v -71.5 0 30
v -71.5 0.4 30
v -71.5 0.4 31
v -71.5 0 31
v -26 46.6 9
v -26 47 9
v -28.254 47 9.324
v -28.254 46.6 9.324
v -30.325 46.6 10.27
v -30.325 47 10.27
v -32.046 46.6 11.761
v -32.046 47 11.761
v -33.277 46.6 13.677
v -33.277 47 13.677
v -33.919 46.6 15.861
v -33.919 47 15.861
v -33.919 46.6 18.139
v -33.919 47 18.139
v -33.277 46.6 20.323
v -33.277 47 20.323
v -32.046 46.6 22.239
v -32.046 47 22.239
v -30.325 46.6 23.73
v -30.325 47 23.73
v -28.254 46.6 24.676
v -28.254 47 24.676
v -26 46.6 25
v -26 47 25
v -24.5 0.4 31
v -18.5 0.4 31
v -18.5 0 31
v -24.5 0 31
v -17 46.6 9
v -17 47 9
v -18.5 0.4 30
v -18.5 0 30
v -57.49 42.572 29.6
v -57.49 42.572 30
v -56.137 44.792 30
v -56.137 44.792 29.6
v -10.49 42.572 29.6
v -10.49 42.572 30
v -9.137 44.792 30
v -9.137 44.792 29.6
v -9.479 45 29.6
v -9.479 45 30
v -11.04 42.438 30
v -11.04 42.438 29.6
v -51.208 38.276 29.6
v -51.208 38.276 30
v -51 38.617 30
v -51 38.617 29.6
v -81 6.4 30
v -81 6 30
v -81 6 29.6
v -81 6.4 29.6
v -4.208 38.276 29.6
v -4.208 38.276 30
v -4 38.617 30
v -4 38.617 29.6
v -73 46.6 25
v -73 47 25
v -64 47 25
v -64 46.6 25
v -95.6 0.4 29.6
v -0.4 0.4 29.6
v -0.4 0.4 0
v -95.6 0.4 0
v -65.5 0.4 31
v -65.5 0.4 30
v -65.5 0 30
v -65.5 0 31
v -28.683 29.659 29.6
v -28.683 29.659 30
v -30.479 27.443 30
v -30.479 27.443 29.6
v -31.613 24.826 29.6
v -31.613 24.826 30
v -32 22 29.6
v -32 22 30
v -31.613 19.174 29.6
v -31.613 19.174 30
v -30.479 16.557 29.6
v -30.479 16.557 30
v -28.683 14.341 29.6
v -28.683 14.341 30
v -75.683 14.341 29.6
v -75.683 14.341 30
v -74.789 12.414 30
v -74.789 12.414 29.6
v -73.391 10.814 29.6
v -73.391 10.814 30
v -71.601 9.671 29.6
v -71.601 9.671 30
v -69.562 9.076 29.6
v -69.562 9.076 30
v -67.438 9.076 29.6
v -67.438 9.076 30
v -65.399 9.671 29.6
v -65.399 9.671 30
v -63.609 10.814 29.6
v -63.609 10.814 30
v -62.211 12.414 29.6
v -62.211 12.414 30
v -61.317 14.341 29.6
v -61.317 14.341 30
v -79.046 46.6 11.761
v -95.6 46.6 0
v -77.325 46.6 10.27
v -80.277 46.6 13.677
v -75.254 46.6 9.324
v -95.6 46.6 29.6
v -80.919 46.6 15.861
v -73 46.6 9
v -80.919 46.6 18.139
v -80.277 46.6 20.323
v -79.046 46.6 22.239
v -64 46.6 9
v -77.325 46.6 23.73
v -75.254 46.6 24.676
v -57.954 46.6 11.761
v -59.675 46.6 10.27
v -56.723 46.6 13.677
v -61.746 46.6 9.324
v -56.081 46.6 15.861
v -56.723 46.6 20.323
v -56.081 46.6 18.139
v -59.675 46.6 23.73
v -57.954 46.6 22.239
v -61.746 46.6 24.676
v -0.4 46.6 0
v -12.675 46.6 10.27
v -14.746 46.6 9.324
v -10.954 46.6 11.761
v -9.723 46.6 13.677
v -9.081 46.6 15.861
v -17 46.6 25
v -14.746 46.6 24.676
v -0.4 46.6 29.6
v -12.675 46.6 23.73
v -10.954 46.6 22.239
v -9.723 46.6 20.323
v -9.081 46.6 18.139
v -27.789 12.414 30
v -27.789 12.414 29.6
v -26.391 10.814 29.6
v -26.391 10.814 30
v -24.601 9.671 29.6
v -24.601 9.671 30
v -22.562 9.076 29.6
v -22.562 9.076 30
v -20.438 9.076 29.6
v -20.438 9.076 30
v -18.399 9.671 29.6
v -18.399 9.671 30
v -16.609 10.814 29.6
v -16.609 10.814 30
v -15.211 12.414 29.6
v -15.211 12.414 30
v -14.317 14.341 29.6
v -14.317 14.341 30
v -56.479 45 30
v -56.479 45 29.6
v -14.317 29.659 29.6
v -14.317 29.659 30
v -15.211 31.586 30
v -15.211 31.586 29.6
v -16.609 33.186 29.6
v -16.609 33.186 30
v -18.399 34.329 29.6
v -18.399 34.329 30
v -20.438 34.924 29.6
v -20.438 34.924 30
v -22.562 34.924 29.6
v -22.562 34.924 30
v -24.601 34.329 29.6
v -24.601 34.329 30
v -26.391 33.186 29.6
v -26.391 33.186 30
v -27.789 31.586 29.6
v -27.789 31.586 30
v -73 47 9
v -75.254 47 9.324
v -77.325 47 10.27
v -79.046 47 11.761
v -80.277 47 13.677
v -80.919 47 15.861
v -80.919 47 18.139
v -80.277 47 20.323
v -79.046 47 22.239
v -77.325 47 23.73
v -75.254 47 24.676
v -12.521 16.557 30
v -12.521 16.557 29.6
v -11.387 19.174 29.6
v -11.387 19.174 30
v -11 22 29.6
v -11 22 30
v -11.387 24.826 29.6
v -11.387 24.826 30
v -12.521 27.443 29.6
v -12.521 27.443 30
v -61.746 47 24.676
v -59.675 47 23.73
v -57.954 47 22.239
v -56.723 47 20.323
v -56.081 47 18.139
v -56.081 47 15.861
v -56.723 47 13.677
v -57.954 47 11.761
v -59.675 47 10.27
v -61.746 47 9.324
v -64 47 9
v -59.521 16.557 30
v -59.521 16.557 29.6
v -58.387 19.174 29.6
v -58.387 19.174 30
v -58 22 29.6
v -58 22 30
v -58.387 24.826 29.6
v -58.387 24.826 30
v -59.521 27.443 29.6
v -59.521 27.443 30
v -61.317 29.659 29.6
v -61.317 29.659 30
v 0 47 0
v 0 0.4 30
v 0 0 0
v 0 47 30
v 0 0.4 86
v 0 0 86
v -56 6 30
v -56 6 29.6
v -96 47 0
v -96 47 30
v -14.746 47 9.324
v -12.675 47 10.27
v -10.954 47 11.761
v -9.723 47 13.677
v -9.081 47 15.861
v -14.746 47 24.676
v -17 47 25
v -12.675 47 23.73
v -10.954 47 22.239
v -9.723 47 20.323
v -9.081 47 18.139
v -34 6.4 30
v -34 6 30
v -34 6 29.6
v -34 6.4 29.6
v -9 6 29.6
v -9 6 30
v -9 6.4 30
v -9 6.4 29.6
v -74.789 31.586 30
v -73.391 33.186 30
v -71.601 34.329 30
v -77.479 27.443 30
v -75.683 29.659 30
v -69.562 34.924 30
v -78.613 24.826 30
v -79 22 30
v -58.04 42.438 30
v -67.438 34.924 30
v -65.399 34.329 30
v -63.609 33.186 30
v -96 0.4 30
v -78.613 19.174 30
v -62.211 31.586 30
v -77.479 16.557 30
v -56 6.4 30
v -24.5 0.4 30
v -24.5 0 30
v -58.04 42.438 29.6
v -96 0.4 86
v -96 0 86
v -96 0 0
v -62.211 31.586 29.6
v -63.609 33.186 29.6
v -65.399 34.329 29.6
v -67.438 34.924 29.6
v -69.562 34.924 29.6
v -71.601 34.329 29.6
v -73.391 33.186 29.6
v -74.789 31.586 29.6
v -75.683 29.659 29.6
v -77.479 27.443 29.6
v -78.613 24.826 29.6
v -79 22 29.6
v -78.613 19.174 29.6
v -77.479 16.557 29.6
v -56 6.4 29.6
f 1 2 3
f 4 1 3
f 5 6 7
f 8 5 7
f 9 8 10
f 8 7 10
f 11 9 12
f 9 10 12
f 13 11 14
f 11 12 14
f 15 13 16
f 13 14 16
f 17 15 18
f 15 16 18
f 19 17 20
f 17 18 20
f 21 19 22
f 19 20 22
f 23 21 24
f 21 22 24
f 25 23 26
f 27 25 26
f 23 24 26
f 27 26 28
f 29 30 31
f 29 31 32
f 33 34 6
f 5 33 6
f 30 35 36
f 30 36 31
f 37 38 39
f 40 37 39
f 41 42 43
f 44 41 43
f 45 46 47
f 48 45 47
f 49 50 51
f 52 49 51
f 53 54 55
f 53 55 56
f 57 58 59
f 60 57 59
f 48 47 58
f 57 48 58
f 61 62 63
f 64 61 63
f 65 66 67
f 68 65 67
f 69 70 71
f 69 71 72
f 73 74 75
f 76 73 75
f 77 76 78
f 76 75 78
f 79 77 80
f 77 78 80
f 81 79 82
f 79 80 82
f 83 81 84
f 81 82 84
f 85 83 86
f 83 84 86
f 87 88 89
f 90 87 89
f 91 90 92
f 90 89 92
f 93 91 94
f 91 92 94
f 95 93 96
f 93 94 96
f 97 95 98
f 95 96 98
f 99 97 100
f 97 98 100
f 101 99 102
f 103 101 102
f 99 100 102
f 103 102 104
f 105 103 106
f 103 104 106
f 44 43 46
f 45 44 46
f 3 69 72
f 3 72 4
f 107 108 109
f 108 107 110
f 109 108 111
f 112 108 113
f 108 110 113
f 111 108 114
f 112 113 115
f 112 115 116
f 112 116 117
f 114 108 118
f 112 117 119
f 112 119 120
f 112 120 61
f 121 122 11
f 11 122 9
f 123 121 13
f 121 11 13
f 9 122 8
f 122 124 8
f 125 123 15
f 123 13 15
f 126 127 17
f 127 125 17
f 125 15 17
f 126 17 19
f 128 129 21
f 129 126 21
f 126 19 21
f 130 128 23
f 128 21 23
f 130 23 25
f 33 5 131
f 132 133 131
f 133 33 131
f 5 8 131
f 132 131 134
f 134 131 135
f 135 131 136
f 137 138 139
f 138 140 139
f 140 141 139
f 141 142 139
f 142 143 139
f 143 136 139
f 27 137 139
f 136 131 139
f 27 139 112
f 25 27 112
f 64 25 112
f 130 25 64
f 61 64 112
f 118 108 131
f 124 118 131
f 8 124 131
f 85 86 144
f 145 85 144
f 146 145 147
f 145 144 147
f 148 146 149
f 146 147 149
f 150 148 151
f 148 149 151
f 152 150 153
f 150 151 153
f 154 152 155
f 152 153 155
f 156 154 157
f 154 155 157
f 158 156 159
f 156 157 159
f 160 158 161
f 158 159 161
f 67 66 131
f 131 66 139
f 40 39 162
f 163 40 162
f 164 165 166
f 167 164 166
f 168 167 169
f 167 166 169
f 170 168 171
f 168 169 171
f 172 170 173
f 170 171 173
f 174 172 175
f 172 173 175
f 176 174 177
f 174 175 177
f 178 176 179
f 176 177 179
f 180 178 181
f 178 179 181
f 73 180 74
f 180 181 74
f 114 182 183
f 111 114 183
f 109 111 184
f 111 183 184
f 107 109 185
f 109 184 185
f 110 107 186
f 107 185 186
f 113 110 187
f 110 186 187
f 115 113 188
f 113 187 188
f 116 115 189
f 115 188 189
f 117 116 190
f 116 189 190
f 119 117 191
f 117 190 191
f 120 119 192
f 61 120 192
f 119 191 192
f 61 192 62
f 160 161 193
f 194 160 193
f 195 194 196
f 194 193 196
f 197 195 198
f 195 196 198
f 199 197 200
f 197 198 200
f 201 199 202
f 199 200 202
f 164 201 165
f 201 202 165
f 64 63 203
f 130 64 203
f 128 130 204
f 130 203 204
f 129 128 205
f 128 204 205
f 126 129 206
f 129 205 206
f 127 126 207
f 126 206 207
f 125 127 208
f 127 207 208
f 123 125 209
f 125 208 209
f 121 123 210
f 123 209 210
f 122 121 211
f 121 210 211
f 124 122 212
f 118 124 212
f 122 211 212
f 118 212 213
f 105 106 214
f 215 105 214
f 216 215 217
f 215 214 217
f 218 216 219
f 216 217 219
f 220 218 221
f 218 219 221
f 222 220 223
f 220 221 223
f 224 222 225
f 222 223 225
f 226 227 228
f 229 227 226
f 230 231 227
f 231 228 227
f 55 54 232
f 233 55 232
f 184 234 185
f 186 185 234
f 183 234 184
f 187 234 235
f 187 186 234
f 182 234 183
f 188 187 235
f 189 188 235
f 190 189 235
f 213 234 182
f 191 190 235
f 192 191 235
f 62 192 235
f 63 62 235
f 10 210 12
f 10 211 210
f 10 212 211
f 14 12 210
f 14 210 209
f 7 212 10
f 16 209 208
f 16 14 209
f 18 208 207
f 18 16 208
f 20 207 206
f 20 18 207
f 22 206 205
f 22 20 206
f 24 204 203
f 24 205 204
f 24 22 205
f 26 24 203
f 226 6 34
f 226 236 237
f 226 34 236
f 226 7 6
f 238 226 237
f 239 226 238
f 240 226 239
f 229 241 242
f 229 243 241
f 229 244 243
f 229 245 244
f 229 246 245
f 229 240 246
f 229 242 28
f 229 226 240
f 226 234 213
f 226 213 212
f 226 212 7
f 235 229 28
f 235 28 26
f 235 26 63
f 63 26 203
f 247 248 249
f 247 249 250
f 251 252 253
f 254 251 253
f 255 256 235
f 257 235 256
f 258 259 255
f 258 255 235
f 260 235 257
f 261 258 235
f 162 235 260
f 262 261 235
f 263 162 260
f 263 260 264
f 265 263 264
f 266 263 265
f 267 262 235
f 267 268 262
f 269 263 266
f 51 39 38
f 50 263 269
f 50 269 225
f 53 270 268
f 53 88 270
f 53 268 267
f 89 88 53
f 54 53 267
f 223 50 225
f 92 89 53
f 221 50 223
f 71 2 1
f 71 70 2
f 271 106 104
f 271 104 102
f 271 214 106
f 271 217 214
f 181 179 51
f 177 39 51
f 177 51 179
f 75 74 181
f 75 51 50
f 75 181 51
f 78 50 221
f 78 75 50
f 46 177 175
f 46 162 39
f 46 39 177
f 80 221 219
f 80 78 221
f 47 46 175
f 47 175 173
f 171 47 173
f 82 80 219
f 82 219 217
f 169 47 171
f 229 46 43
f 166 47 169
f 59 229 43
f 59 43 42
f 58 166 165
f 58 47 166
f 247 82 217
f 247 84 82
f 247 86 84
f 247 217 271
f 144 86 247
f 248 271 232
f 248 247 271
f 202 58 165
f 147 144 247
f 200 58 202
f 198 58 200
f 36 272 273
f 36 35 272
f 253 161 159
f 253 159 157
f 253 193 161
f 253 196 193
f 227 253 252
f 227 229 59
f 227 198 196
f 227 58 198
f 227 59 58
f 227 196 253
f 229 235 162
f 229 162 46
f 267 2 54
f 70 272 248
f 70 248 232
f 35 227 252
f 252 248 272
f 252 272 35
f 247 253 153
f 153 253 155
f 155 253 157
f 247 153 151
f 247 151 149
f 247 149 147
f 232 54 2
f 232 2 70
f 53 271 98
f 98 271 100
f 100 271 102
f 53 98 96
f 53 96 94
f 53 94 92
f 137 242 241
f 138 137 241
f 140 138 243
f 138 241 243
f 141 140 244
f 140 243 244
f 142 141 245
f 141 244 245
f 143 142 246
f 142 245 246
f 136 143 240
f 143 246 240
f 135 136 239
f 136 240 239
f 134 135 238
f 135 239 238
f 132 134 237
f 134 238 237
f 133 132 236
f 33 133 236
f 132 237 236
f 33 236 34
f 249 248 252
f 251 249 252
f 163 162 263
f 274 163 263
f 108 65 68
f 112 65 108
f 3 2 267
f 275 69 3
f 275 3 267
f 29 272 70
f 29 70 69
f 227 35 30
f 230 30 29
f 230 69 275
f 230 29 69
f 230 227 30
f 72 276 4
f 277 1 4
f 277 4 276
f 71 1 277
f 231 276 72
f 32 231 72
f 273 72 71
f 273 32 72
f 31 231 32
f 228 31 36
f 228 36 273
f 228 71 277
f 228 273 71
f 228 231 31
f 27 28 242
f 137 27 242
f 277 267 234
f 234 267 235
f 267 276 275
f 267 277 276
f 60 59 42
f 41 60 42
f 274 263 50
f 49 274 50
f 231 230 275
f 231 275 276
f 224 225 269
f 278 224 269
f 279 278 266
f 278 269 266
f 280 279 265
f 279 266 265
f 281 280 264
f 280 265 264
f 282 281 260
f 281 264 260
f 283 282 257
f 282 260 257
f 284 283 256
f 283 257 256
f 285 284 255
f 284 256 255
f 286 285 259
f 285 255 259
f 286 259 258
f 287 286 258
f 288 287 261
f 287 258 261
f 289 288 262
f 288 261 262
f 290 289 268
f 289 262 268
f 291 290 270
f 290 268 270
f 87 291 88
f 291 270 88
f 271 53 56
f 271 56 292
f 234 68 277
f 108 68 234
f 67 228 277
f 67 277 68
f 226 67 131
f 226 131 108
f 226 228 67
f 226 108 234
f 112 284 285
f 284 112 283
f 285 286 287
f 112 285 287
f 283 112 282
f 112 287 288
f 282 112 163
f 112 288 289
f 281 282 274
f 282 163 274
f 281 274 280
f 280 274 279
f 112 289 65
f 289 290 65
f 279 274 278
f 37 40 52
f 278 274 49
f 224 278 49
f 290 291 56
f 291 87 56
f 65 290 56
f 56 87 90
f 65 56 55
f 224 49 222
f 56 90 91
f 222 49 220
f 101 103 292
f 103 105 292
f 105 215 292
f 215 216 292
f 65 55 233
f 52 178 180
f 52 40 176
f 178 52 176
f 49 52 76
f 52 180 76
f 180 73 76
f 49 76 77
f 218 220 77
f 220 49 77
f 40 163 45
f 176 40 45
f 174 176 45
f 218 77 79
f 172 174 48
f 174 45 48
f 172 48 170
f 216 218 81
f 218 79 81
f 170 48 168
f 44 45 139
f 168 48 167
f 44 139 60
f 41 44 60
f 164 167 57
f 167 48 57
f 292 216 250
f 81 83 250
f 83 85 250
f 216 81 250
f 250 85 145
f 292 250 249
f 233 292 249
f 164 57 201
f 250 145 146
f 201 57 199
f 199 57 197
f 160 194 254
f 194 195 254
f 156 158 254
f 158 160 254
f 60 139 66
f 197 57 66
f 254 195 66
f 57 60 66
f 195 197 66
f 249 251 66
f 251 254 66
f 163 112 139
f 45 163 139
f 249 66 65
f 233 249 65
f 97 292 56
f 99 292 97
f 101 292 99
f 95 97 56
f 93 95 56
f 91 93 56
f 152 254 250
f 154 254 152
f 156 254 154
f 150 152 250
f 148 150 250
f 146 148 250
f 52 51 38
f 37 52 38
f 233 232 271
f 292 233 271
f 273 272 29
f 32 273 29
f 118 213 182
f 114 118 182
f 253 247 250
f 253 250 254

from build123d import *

# Parameters (mm, degrees)
F1_DEPTH = 96
F2_T     = -0.4
F3_W     = 25
F3_H     = 0.4
F4_DEPTH = 0.4
F6_DEPTH = 0.4
F5_W     = 6
F5_H     = 1
F7_DEPTH = 47


with BuildPart() as f1:
    # F0 (on Right) → F1 (new body)
    with BuildSketch(Plane.YZ):
        Polygon((0, 30), (0, 0), (47, 0), (47, 30), (0.4, 30), (0.4, 86), (0, 86), align=None)
    extrude(amount=-F1_DEPTH)

    # F2
    f2_openings = [f1.faces().sort_by_distance(p)[0] for p in [
        (-48, 23.5, 0),
    ]]
    offset(amount=F2_T, openings=f2_openings, kind=Kind.INTERSECTION)

    # F3 (on face) → F4 (cut, through all)
    with BuildSketch(Plane.XY.offset(30)):
        with BuildLine():
            ThreePointArc((-75.6825014059, 14.3409090909), (-68.5, 9), (-61.3174985941, 14.3409090909))
            ThreePointArc((-61.3174985941, 14.3409090909), (-58, 22), (-61.3174985941, 29.6590909091))
            ThreePointArc((-61.3174985941, 29.6590909091), (-68.5, 35), (-75.6825014059, 29.6590909091))
            ThreePointArc((-75.6825014059, 29.6590909091), (-79, 22), (-75.6825014059, 14.3409090909))
        make_face()
        with Locations((-68.5, 6.2)):
            Rectangle(F3_W, F3_H)
        Polygon((-51.2081224133, 38.2756121002), (-51, 38.6172040513), (-57.4902470714, 42.5715299044), (-56.1374513849, 44.7918775867), (-56.479043336, 45), (-58.0399614359, 42.4380603665), align=None)
        with BuildLine():
            ThreePointArc((-14.3174985941, 14.3409090909), (-11, 22), (-14.3174985941, 29.6590909091))
            ThreePointArc((-14.3174985941, 29.6590909091), (-21.5, 35), (-28.6825014059, 29.6590909091))
            ThreePointArc((-28.6825014059, 29.6590909091), (-32, 22), (-28.6825014059, 14.3409090909))
            ThreePointArc((-28.6825014059, 14.3409090909), (-21.5, 9), (-14.3174985941, 14.3409090909))
        make_face()
        with Locations((-21.5, 6.2)):
            Rectangle(F3_W, F3_H)
        Polygon((-11.0399614359, 42.4380603665), (-4.2081224133, 38.2756121002), (-4, 38.6172040513), (-10.4902470714, 42.5715299044), (-9.1374513849, 44.7918775867), (-9.479043336, 45), align=None)
    extrude(amount=-F4_DEPTH, mode=Mode.SUBTRACT)

    # F5 (on face) → F6 (cut, through all)
    with BuildSketch(Plane(origin=(0, 47, 0), x_dir=(-1, 0, 0), z_dir=(0, 1, 0))):
        with BuildLine():
            Line((17, 9), (26, 9))
            ThreePointArc((26, 9), (34, 17), (26, 25))
            Line((26, 25), (17, 25))
            ThreePointArc((17, 25), (9, 17), (17, 9))
        make_face()
        with BuildLine():
            Line((64, 9), (73, 9))
            ThreePointArc((73, 9), (81, 17), (73, 25))
            Line((73, 25), (64, 25))
            ThreePointArc((64, 25), (56, 17), (64, 9))
        make_face()
    extrude(amount=-F6_DEPTH, mode=Mode.SUBTRACT)

    # F5 (on face) → F7 (cut, through all)
    with BuildSketch(Plane(origin=(0, 47, 0), x_dir=(-1, 0, 0), z_dir=(0, 1, 0))):
        with Locations((21.5, 30.5)):
            Rectangle(F5_W, F5_H)
        with Locations((68.5, 30.5)):
            Rectangle(F5_W, F5_H)
    extrude(amount=-F7_DEPTH, mode=Mode.SUBTRACT)


solid = f1.part
